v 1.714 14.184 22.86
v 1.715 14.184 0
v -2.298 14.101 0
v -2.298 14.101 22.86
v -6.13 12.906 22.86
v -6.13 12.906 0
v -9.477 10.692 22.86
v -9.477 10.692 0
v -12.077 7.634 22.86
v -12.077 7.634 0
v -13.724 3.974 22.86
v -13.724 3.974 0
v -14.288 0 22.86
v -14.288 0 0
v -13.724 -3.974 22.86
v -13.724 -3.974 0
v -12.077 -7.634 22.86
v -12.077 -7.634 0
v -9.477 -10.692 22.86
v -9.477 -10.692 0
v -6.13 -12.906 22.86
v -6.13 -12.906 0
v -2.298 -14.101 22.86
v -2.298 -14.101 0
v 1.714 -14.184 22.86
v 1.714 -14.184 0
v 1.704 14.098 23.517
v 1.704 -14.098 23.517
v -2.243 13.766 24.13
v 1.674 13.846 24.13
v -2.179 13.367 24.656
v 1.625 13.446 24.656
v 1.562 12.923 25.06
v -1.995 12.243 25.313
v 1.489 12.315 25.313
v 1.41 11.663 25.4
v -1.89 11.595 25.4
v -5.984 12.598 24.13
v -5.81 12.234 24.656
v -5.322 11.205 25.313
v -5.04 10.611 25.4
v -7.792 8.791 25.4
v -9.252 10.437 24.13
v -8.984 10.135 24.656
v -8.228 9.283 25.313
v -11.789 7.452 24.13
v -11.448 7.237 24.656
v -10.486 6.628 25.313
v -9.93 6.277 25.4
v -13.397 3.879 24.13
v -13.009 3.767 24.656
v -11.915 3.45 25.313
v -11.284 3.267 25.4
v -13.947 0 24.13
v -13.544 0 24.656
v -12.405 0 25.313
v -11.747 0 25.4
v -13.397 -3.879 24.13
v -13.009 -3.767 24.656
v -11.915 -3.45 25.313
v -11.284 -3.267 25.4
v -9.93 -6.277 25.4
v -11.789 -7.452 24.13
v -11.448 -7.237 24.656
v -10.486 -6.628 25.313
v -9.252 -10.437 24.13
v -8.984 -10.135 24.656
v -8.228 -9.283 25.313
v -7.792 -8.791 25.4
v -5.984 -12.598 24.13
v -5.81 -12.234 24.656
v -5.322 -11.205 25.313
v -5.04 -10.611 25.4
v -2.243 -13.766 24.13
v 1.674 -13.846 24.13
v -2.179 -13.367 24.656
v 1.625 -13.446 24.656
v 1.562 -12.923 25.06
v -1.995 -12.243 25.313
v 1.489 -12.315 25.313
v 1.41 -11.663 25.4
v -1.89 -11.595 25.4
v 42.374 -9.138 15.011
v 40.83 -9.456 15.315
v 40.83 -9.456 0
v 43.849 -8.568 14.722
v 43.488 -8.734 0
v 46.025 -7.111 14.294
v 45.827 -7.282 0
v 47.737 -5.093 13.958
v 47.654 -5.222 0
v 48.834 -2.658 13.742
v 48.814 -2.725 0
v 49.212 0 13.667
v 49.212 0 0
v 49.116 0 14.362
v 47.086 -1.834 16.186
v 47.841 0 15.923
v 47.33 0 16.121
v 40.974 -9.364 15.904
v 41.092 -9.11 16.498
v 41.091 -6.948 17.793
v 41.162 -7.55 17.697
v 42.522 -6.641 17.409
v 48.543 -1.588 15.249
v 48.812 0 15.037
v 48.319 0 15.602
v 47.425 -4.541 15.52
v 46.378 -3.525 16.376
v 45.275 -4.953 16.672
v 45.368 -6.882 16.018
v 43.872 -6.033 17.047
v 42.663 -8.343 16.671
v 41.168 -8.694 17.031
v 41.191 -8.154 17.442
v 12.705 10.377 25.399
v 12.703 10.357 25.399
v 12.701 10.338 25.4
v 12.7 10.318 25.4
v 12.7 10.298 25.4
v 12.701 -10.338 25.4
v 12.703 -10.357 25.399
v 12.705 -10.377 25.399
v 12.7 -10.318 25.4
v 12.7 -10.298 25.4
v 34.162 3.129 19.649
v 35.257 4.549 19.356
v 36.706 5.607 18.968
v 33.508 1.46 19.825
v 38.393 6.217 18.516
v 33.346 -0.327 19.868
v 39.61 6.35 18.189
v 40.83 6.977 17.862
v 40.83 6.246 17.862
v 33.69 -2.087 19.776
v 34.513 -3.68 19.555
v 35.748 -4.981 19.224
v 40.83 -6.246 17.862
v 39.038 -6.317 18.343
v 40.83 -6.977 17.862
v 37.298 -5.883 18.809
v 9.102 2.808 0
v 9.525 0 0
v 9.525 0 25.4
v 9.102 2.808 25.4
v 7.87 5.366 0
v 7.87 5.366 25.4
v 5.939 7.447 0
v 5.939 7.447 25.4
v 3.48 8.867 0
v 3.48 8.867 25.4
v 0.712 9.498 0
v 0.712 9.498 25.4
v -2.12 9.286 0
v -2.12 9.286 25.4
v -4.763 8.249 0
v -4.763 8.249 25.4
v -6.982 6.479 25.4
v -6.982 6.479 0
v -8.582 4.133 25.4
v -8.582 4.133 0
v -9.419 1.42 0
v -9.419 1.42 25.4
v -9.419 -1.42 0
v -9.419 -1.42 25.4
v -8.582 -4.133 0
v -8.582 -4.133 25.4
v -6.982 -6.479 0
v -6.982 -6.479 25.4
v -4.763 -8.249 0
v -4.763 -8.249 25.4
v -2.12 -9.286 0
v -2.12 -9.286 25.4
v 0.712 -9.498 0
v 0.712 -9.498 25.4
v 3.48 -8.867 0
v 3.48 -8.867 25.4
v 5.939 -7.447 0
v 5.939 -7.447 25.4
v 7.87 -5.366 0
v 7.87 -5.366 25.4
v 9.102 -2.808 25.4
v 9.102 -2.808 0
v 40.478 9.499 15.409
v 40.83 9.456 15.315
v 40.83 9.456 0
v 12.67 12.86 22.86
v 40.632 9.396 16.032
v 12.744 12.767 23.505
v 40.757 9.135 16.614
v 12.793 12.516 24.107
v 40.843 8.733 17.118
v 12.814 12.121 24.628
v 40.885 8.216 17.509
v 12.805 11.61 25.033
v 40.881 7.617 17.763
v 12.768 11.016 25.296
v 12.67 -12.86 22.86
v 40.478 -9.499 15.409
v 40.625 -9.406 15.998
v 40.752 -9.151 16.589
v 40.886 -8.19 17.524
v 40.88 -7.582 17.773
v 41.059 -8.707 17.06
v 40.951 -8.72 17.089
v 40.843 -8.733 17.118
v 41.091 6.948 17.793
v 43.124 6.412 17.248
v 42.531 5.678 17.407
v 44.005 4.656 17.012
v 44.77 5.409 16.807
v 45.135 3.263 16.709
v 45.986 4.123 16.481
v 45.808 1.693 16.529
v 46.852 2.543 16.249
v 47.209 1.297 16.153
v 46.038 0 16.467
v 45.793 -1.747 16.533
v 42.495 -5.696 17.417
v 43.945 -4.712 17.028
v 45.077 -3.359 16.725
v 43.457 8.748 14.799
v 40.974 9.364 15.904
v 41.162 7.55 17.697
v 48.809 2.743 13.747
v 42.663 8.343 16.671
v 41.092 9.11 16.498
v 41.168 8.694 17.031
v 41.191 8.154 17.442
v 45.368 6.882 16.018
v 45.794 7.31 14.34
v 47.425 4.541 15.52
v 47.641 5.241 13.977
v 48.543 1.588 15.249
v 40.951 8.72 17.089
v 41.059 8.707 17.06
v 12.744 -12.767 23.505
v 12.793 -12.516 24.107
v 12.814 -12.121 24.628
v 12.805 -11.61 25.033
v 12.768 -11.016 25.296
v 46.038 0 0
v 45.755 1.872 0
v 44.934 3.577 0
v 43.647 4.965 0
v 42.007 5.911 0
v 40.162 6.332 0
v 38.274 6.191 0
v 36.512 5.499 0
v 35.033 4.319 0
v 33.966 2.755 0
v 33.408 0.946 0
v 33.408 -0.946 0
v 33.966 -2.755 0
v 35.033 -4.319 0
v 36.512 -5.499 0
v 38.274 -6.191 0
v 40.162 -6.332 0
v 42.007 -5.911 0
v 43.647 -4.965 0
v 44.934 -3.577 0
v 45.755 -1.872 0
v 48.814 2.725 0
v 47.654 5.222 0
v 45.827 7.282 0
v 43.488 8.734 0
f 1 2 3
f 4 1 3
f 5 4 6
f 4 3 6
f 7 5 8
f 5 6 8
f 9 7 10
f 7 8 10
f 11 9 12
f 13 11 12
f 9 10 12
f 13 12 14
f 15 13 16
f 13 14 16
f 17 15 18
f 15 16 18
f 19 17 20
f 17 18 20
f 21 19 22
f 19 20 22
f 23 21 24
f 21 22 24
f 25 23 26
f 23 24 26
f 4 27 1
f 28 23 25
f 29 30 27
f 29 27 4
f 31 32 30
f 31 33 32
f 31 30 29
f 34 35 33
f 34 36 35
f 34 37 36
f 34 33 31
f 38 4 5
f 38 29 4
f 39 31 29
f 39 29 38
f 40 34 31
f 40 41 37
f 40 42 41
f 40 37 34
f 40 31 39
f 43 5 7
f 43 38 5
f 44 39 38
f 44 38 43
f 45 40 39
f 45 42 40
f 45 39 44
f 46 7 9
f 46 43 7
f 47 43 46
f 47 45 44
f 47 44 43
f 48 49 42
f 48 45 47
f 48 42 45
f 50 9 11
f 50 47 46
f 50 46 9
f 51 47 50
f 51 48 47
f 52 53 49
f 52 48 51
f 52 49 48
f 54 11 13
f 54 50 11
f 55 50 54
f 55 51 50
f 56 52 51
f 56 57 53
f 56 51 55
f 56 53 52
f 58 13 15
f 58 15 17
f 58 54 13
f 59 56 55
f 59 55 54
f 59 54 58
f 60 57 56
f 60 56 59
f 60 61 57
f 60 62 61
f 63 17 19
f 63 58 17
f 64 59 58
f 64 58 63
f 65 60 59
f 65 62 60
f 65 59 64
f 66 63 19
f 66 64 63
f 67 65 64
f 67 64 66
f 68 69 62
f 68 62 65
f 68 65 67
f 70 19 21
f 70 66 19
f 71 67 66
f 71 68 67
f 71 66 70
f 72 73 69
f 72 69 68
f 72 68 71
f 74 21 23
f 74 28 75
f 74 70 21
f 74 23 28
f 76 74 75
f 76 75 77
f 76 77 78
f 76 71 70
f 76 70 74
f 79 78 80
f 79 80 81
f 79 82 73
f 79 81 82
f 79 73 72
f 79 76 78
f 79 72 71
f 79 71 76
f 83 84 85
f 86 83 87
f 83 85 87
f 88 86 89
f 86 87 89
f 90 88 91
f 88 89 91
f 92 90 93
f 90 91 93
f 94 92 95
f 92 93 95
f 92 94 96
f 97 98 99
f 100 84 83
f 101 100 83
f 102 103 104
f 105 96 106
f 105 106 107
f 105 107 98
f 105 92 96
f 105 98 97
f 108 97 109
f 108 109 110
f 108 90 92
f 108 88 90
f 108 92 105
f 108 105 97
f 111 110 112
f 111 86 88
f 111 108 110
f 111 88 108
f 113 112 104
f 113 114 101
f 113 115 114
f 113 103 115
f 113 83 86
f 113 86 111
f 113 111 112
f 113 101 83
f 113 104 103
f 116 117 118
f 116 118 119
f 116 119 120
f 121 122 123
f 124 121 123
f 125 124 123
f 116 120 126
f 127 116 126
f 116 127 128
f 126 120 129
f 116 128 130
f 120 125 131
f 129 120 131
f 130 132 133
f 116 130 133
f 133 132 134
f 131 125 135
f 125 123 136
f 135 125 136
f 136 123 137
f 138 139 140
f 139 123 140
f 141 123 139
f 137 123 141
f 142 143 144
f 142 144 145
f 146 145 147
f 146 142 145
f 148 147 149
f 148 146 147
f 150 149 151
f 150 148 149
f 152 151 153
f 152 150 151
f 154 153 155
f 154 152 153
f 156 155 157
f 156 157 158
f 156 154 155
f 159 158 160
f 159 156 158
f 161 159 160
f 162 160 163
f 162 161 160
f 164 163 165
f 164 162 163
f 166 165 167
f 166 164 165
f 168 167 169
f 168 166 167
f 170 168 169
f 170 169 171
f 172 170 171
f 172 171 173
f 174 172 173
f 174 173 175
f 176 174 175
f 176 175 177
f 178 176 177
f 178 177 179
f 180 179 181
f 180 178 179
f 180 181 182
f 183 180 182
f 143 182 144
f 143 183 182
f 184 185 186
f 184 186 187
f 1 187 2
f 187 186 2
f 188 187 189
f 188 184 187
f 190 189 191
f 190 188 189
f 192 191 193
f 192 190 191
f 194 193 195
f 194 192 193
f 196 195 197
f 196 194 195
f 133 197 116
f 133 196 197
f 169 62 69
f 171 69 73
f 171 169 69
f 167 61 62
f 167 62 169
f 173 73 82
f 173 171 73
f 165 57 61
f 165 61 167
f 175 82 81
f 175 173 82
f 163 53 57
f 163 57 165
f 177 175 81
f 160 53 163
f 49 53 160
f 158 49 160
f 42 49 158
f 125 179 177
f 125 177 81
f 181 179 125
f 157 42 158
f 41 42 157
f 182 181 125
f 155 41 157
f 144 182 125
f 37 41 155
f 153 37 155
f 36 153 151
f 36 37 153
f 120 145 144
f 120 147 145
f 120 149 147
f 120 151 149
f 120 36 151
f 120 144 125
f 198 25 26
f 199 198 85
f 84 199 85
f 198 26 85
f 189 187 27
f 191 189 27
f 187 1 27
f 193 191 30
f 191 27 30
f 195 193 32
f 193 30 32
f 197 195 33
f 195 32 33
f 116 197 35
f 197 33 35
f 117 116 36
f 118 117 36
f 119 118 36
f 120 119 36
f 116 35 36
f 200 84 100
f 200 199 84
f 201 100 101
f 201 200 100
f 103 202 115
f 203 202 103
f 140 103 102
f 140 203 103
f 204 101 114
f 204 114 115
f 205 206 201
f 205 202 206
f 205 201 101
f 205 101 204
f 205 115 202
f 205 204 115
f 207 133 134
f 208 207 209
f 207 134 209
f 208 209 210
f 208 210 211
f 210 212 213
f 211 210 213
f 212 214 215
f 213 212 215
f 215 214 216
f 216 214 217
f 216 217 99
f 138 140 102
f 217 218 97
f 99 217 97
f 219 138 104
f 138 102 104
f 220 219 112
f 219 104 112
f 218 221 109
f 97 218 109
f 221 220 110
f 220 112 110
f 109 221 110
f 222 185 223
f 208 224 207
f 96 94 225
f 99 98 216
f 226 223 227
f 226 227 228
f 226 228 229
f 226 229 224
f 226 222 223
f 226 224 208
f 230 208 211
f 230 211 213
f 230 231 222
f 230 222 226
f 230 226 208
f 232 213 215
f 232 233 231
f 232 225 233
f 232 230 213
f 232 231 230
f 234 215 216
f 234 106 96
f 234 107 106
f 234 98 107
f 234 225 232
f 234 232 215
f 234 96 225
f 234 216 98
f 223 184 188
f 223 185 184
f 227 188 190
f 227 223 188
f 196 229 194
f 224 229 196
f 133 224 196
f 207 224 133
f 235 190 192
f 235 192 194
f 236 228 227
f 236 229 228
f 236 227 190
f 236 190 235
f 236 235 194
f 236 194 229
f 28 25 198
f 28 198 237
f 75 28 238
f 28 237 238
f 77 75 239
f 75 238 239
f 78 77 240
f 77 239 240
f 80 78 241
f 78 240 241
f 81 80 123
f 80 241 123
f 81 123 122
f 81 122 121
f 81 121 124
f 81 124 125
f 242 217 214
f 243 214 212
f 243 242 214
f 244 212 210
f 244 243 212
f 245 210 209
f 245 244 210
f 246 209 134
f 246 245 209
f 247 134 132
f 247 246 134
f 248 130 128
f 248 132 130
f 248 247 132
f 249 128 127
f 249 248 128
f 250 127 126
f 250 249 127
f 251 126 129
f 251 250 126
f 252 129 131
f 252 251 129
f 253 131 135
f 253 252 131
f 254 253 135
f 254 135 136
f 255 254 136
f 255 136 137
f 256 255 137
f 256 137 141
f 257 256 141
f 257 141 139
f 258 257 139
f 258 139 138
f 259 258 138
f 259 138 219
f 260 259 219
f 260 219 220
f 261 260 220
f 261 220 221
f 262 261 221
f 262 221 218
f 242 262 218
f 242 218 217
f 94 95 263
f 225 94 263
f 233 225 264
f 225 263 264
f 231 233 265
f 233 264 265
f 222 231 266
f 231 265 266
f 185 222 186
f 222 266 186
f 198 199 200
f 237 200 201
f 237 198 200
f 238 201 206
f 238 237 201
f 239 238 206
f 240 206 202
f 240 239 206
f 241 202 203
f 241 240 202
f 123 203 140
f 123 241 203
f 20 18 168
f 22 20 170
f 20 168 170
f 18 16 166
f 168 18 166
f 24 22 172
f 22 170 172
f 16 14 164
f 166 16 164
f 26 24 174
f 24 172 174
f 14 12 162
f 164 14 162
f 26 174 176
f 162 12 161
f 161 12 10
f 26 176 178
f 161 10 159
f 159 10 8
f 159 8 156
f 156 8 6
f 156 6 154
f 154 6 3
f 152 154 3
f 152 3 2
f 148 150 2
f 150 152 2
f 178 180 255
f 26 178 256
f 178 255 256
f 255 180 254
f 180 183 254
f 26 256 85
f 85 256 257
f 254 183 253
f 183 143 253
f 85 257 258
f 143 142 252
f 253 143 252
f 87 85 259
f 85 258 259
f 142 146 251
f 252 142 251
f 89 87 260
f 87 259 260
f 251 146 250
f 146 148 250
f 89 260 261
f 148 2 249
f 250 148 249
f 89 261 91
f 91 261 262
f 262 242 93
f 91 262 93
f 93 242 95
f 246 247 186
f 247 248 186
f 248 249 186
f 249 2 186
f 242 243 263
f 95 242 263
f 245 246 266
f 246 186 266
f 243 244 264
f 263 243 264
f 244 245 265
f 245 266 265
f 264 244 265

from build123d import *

# Parameters (mm, degrees)
F0_R     = 9.525
F0_R_2   = 6.35
F1_DEPTH = 25.4
F3_DEPTH = 15.24
F4_R     = 2.54


with BuildPart() as f1:
    # F0 (on Top) → F1 (new body)
    with BuildSketch(Plane.XY):
        with BuildLine():
            ThreePointArc((1.7145, -14.184257), (10.691786, -9.477255), (14.2875, 0))
            ThreePointArc((14.2875, 0), (10.691786, 9.477255), (1.7145, 14.184257))
            ThreePointArc((1.7145, 14.184257), (-14.2875, 0), (1.7145, -14.184257))
        make_face()
        Circle(F0_R, mode=Mode.SUBTRACT)
        with BuildLine():
            ThreePointArc((1.7145, 14.184257), (10.691786, 9.477255), (14.2875, 0))
            ThreePointArc((14.2875, 0), (10.691786, -9.477255), (1.7145, -14.184257))
            Line((1.7145, -14.184257), (40.8305, -9.456171))
            ThreePointArc((40.8305, -9.456171), (30.1625, 0), (40.8305, 9.456171))
            Line((40.8305, 9.456171), (1.7145, 14.184257))
        make_face()
        with BuildLine():
            ThreePointArc((49.2125, 0), (46.815357, 6.31817), (40.8305, 9.456171))
            ThreePointArc((40.8305, 9.456171), (30.1625, 0), (40.8305, -9.456171))
            ThreePointArc((40.8305, -9.456171), (46.815357, -6.31817), (49.2125, 0))
        make_face()
        with Locations((39.6875, 0)):
            Circle(F0_R_2, mode=Mode.SUBTRACT)
    extrude(amount=F1_DEPTH)

    # F2 (on Front) → F3 (cut, symmetric)
    with BuildSketch(Plane.XZ):
        Polygon((40.8305, 25.4), (12.7, 25.4), (40.8305, 17.862455), align=None)
        Polygon((49.2125, 25.4), (40.8305, 25.4), (40.8305, 17.862455), (49.2125, 15.616505), align=None)
    extrude(amount=F3_DEPTH, both=True, mode=Mode.SUBTRACT)

    # F4
    f4_edges = [f1.edges().sort_by_distance(p)[0] for p in [
        (26.76525, -11.156287, 21.631228),
        (-14.2875, 0, 25.4),
    ]]
    fillet(f4_edges, radius=F4_R)


solid = f1.part
